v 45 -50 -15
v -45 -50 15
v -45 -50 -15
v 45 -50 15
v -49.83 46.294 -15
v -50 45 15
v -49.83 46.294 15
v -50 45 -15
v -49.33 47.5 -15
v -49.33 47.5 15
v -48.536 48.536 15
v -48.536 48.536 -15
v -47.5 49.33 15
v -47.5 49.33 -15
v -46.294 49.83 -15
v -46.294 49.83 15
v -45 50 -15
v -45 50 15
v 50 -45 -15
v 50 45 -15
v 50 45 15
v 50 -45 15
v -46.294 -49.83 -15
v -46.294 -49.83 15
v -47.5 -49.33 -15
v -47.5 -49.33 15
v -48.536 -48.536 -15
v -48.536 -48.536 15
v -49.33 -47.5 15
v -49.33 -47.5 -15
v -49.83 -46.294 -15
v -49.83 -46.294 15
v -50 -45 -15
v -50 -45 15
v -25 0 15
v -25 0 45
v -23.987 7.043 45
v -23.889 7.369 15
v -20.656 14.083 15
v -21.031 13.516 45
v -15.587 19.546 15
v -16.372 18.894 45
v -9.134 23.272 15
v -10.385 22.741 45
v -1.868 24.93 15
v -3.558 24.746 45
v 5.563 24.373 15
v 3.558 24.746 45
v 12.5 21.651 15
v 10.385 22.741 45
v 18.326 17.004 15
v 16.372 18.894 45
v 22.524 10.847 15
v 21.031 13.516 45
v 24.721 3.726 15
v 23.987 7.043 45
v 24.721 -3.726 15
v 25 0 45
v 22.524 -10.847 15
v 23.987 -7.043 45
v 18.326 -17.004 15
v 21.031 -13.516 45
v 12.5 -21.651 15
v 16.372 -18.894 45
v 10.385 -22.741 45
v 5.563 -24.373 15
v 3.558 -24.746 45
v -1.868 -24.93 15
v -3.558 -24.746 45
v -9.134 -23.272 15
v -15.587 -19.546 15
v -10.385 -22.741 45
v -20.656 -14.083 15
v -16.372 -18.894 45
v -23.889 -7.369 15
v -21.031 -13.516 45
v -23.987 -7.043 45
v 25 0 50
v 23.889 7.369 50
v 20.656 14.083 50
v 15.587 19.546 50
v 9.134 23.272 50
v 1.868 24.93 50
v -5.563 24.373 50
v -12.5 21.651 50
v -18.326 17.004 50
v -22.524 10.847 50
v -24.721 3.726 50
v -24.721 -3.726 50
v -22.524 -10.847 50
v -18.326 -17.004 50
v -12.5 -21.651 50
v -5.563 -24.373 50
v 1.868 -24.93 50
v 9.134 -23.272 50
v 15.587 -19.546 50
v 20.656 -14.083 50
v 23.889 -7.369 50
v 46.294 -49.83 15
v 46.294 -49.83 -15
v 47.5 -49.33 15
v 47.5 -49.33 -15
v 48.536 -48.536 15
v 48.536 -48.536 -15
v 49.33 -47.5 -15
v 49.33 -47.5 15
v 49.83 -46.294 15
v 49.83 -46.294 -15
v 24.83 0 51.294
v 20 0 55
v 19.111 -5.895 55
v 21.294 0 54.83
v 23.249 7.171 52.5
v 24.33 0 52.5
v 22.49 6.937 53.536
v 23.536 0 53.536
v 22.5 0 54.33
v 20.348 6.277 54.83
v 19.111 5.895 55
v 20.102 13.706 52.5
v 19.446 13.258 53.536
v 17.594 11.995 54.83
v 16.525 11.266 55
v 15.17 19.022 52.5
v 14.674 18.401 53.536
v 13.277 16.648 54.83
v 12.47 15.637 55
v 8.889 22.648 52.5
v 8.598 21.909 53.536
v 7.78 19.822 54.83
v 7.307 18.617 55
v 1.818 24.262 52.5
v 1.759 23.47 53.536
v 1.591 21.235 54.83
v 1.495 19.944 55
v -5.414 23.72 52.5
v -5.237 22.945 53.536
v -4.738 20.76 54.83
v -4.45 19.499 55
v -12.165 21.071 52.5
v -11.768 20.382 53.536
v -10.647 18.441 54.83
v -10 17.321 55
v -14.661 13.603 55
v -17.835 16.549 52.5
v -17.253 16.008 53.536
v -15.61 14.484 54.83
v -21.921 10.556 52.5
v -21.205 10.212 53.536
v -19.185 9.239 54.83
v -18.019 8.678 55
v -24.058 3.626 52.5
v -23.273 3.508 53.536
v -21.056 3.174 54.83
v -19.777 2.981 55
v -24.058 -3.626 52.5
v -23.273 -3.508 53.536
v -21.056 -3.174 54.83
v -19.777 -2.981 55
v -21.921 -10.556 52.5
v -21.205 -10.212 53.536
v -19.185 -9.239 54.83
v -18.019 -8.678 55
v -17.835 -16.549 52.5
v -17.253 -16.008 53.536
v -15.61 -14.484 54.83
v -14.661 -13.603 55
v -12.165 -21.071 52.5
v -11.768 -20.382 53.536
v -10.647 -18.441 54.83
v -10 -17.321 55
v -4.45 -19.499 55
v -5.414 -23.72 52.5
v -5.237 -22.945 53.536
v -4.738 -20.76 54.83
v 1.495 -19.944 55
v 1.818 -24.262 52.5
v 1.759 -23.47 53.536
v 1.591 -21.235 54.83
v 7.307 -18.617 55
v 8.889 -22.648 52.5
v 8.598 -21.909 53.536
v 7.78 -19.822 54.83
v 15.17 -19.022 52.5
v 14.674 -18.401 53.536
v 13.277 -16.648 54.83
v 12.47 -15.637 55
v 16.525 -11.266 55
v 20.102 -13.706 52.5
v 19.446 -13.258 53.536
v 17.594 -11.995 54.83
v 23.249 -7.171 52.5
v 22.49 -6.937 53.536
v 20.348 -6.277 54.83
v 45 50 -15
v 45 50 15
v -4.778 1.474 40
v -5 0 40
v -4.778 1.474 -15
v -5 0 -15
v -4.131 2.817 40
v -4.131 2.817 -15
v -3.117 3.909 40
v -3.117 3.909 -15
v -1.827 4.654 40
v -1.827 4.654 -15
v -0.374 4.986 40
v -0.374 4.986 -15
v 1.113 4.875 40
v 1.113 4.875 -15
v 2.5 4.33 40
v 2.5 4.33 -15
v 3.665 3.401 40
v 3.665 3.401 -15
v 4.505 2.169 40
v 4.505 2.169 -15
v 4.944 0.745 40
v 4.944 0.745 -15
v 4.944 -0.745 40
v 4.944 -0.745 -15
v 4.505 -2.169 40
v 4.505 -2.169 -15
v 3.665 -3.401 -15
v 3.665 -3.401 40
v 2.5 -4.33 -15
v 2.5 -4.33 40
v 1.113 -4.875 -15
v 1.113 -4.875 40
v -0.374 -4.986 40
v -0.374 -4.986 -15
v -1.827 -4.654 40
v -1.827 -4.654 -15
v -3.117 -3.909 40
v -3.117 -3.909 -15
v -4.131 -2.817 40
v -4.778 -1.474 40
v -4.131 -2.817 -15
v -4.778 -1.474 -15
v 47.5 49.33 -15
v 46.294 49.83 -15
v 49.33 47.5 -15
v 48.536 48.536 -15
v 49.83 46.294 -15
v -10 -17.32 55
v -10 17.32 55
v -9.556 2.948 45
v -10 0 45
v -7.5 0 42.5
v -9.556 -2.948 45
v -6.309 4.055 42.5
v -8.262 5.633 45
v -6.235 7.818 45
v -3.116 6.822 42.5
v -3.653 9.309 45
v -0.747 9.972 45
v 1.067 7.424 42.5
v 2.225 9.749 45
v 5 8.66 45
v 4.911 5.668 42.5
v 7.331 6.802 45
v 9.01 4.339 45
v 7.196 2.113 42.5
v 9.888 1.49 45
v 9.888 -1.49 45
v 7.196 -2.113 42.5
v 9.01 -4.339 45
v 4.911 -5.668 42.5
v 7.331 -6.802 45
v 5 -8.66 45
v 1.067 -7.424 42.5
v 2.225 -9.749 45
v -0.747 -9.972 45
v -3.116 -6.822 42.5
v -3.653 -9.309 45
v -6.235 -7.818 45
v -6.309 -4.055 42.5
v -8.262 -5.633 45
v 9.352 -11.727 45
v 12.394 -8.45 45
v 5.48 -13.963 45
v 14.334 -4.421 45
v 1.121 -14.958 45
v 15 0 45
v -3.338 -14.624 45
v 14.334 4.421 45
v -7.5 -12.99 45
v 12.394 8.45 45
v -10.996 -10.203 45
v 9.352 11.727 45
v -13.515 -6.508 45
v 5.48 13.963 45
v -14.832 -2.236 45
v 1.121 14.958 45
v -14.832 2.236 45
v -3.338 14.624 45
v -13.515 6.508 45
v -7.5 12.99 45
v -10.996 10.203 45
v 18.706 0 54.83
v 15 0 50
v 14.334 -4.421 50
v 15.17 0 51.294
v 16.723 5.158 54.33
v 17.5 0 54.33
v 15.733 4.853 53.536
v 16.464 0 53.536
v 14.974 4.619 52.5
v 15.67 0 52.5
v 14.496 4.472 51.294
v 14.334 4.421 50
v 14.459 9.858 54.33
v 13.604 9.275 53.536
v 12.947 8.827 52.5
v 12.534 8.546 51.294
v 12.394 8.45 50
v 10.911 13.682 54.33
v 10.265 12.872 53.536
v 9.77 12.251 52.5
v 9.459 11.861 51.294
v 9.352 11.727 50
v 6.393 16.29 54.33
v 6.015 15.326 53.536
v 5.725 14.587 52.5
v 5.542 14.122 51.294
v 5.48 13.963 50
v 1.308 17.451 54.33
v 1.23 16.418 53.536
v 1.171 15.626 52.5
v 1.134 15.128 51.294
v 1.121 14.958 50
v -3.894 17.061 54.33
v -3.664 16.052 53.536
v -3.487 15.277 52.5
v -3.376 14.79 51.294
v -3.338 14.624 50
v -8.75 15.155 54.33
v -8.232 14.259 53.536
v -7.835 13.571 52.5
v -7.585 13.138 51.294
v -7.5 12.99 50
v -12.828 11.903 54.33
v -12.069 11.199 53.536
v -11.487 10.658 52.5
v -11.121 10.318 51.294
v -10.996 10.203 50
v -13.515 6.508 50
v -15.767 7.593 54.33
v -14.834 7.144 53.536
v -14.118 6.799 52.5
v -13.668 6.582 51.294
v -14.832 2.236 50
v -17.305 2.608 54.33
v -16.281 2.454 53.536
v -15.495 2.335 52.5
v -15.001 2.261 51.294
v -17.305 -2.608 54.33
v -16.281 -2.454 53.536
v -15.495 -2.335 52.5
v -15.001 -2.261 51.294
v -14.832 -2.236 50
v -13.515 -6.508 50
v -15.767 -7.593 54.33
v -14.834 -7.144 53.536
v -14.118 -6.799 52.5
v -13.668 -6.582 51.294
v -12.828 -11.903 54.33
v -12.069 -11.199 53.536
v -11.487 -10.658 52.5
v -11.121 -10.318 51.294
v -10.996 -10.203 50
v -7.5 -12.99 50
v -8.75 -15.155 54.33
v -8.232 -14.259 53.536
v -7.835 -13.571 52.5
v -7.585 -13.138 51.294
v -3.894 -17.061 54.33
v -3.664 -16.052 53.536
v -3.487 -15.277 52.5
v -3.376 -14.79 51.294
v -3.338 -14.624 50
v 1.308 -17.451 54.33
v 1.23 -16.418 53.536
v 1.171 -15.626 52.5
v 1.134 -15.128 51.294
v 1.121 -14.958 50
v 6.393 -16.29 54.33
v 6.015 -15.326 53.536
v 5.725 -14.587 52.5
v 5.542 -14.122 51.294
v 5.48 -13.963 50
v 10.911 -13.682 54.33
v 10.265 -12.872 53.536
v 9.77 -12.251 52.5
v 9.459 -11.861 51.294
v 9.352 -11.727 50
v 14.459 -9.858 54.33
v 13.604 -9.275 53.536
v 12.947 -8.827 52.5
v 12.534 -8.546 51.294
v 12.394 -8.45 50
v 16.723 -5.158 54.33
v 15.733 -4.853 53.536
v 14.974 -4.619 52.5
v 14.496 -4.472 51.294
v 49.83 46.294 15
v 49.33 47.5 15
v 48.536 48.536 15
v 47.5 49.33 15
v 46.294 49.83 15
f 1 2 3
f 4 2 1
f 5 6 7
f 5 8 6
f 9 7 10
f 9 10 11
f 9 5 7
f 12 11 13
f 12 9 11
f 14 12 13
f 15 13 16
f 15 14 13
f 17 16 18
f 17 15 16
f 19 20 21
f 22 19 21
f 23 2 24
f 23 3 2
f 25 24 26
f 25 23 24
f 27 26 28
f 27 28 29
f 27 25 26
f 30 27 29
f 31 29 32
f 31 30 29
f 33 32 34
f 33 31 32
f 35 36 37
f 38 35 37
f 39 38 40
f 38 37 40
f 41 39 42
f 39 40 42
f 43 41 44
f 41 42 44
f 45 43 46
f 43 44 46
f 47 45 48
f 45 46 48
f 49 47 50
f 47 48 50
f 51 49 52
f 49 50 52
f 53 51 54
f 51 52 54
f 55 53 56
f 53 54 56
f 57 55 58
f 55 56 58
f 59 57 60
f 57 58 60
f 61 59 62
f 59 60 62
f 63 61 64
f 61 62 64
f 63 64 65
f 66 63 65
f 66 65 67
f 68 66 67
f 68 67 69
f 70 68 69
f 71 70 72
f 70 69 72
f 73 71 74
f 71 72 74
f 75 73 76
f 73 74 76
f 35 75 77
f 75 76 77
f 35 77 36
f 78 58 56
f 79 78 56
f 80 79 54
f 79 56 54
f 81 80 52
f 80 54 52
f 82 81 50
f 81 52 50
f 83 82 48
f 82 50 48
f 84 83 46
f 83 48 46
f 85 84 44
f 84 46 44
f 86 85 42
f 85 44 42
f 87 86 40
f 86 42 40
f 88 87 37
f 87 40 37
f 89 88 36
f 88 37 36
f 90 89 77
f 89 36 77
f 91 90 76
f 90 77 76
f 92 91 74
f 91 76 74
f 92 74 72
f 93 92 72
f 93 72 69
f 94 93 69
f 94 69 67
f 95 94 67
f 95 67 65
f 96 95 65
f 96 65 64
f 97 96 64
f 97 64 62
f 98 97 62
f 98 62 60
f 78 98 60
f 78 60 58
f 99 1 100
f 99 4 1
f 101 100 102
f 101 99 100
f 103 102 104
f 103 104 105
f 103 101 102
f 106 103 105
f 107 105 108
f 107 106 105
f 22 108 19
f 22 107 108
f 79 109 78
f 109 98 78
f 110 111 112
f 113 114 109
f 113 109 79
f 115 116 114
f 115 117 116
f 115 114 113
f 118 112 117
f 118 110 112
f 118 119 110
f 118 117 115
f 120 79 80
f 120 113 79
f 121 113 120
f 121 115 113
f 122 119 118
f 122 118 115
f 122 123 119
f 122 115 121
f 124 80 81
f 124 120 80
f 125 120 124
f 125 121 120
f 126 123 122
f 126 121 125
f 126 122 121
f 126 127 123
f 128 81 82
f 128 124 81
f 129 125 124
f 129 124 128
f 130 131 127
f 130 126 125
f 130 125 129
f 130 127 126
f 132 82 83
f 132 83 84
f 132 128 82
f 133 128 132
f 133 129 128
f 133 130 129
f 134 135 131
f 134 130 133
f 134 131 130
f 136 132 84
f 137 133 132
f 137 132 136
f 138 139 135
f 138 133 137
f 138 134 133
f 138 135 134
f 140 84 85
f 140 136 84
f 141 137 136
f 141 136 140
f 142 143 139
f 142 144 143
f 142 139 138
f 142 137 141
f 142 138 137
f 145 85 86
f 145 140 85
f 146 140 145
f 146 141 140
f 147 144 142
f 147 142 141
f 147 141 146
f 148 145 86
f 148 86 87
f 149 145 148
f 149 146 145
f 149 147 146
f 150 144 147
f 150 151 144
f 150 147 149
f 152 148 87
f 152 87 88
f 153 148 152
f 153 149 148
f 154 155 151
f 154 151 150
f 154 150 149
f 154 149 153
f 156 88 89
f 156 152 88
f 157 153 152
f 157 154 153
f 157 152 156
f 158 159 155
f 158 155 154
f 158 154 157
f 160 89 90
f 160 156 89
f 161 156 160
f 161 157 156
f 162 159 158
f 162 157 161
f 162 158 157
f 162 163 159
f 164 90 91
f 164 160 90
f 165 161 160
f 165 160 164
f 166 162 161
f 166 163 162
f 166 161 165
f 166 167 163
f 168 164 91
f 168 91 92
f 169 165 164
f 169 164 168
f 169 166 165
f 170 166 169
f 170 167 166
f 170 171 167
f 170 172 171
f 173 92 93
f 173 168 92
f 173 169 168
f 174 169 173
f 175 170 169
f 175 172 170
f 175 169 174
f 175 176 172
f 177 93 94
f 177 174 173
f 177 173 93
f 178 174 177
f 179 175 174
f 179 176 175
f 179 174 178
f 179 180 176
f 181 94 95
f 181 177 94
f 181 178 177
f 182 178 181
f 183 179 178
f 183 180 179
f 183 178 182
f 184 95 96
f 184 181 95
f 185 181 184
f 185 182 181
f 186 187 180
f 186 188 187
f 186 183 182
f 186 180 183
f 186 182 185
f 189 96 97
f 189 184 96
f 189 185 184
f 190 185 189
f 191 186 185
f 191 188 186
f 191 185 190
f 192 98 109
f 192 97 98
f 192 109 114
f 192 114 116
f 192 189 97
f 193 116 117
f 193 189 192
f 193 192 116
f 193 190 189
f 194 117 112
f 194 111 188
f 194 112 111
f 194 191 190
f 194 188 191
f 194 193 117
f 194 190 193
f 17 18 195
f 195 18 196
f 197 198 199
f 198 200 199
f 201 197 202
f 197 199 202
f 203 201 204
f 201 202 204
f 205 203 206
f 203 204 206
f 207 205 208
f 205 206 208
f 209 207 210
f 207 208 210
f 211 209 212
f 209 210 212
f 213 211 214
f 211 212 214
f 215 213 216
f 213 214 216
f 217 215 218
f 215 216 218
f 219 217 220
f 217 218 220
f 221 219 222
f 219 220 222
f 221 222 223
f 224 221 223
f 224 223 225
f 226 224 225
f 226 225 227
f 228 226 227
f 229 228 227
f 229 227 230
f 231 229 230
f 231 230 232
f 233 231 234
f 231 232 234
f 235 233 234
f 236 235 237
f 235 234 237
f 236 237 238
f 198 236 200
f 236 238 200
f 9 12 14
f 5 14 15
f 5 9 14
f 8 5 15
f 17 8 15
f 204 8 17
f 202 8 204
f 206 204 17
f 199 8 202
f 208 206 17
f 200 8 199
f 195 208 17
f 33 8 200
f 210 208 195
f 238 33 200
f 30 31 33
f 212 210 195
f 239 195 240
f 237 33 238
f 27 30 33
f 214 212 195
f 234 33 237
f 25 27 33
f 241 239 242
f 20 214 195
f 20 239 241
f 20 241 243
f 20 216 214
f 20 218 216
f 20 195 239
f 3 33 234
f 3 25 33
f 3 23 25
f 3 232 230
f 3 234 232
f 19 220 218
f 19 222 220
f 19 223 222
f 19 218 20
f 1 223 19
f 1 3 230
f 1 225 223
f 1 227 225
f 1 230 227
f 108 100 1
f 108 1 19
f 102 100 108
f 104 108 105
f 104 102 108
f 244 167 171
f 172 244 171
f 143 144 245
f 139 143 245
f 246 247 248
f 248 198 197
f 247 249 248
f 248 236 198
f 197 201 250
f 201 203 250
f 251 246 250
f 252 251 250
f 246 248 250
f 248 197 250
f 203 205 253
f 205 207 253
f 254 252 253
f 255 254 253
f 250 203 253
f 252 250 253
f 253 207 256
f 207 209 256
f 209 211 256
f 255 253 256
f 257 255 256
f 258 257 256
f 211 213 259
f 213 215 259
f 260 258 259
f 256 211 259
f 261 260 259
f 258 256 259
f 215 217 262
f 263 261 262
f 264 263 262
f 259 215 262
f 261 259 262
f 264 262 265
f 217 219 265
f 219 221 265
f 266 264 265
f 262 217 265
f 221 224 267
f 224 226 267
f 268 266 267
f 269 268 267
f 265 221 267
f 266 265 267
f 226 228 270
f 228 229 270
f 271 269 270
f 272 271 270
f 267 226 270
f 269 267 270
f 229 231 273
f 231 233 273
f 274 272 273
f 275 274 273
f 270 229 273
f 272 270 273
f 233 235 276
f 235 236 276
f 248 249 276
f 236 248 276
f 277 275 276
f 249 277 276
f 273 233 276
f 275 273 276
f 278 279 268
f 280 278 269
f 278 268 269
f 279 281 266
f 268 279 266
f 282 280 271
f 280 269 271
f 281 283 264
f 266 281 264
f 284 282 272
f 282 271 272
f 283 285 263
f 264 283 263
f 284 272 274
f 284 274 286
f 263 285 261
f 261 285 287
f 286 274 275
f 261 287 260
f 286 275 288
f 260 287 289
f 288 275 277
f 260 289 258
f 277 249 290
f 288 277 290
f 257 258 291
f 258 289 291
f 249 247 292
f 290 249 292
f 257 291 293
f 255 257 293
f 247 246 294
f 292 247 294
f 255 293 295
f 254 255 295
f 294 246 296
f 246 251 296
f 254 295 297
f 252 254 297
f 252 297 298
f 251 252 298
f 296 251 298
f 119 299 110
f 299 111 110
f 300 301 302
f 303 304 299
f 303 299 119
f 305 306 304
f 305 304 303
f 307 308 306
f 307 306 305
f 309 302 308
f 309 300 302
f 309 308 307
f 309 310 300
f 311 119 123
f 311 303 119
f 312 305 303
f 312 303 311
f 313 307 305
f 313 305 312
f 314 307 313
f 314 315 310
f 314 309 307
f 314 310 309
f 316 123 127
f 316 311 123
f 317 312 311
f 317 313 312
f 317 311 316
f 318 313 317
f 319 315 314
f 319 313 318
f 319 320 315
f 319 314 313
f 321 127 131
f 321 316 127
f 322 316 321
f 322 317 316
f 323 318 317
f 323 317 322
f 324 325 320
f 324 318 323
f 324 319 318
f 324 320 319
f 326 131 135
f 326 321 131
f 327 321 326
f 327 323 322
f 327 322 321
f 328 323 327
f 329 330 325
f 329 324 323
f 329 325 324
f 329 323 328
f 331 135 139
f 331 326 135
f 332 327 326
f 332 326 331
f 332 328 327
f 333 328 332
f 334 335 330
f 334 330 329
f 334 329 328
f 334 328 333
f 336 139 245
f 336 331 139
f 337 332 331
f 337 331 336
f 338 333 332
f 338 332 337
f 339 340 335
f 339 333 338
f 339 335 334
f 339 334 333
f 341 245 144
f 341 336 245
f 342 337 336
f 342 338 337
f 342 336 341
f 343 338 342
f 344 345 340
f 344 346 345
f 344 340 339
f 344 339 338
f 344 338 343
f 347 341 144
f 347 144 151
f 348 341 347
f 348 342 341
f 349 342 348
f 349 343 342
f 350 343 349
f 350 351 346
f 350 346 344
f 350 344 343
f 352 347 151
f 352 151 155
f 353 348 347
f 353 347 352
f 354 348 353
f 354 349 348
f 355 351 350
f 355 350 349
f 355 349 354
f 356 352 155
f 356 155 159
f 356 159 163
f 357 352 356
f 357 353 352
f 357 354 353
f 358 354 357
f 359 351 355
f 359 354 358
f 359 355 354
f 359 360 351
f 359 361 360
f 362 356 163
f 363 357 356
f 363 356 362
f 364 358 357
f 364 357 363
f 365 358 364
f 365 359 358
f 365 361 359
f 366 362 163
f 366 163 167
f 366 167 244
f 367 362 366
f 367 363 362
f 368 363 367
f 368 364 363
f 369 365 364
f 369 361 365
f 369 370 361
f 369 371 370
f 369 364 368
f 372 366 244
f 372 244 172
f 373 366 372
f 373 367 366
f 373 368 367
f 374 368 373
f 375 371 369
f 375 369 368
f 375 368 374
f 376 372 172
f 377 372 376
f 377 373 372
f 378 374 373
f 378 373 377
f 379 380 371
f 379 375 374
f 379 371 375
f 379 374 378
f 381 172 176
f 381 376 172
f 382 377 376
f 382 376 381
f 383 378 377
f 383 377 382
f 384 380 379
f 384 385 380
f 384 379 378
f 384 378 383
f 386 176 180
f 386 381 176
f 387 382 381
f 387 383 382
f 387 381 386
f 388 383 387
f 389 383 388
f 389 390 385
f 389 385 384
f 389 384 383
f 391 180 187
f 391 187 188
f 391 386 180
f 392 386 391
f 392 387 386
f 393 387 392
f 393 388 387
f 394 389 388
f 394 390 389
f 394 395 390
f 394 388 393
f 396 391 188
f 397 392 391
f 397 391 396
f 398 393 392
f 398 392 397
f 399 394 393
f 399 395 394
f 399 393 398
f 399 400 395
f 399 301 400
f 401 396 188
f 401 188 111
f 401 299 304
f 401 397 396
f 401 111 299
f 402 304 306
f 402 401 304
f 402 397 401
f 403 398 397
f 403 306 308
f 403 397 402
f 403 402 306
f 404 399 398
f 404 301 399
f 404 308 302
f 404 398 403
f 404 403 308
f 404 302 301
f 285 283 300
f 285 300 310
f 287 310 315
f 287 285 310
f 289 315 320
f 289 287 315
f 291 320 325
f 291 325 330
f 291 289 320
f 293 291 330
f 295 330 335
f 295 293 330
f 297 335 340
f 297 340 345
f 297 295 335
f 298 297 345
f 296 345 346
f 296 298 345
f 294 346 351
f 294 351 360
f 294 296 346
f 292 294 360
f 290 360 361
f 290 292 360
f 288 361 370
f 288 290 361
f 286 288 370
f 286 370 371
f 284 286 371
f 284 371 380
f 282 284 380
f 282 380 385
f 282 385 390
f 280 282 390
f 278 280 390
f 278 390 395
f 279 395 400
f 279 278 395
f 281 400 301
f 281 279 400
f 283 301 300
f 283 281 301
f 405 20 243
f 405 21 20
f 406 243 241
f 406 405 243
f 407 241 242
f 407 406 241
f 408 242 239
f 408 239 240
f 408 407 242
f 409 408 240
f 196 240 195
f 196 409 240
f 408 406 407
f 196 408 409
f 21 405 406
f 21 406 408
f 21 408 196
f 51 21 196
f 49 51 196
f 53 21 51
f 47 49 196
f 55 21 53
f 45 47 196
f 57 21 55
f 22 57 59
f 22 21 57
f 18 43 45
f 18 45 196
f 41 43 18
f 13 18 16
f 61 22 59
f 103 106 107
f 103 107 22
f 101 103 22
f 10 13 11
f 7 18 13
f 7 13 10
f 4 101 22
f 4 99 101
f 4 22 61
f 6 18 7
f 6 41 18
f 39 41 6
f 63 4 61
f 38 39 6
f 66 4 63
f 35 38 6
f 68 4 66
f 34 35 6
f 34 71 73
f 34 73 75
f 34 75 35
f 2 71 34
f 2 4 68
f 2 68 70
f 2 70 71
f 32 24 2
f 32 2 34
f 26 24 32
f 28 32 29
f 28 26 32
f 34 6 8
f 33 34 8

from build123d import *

# Parameters (mm, degrees)
F1_DEPTH       = 50
F0_W           = 25
F0_H           = 30
F4_D           = 10
F4_CSINK_D     = 20
F4_CSINK_ANGLE = 90
F5_R           = 5
F3_R           = 25
F3_R_2         = 15
F6_DEPTH       = 10
F7_R           = 4.99999


# Not quite as in the source:
# - a fillet or chamfer is up to 0.001 mm smaller than in the source, because OpenCascade refuses the exact size


with BuildPart() as f1:
    # F0 (on Front) → F1 (new body, symmetric)
    with BuildSketch(Plane.XZ):
        Polygon((50, 15), (25, 15), (0, 15), (0, -15), (50, -15), align=None)
        Polygon((0, -15), (0, 15), (-25, 15), (-50, 15), (-50, -15), align=None)
    extrude(amount=F1_DEPTH, both=True)

    # F0 (on Front) → F2 (revolve)
    with BuildSketch(Plane.XZ):
        with Locations((-12.5, 30)):
            Rectangle(F0_W, F0_H)
    revolve(axis=Axis((0, 0, 15), (0, 0, -1)))

    # F4 (through all)
    with Locations(Plane.XY.offset(45)):
        with Locations((0, 0)):
            CounterSinkHole(F4_D / 2, F4_CSINK_D / 2, counter_sink_angle=F4_CSINK_ANGLE)

    # F5
    f5_edges = [f1.edges().sort_by_distance(p)[0] for p in [
        (-50, 50, 0),
        (50, 50, 0),
        (50, -50, 0),
        (-50, -50, 0),
    ]]
    fillet(f5_edges, radius=F5_R)

    # F3 (on face) → F6 (join)
    with BuildSketch(Plane.XY.offset(45)):
        Circle(F3_R)
        Circle(F3_R_2, mode=Mode.SUBTRACT)
    extrude(amount=F6_DEPTH)

    # F7 (radius 5 in the source; OpenCascade refuses exactly that, so slightly less here)
    f7_edges = [f1.edges().sort_by_distance(p)[0] for p in [
        (-25, 0, 55),
        (-25, 0, 30),
        (-15, 0, 55),
    ]]
    fillet(f7_edges, radius=F7_R)


solid = f1.part
